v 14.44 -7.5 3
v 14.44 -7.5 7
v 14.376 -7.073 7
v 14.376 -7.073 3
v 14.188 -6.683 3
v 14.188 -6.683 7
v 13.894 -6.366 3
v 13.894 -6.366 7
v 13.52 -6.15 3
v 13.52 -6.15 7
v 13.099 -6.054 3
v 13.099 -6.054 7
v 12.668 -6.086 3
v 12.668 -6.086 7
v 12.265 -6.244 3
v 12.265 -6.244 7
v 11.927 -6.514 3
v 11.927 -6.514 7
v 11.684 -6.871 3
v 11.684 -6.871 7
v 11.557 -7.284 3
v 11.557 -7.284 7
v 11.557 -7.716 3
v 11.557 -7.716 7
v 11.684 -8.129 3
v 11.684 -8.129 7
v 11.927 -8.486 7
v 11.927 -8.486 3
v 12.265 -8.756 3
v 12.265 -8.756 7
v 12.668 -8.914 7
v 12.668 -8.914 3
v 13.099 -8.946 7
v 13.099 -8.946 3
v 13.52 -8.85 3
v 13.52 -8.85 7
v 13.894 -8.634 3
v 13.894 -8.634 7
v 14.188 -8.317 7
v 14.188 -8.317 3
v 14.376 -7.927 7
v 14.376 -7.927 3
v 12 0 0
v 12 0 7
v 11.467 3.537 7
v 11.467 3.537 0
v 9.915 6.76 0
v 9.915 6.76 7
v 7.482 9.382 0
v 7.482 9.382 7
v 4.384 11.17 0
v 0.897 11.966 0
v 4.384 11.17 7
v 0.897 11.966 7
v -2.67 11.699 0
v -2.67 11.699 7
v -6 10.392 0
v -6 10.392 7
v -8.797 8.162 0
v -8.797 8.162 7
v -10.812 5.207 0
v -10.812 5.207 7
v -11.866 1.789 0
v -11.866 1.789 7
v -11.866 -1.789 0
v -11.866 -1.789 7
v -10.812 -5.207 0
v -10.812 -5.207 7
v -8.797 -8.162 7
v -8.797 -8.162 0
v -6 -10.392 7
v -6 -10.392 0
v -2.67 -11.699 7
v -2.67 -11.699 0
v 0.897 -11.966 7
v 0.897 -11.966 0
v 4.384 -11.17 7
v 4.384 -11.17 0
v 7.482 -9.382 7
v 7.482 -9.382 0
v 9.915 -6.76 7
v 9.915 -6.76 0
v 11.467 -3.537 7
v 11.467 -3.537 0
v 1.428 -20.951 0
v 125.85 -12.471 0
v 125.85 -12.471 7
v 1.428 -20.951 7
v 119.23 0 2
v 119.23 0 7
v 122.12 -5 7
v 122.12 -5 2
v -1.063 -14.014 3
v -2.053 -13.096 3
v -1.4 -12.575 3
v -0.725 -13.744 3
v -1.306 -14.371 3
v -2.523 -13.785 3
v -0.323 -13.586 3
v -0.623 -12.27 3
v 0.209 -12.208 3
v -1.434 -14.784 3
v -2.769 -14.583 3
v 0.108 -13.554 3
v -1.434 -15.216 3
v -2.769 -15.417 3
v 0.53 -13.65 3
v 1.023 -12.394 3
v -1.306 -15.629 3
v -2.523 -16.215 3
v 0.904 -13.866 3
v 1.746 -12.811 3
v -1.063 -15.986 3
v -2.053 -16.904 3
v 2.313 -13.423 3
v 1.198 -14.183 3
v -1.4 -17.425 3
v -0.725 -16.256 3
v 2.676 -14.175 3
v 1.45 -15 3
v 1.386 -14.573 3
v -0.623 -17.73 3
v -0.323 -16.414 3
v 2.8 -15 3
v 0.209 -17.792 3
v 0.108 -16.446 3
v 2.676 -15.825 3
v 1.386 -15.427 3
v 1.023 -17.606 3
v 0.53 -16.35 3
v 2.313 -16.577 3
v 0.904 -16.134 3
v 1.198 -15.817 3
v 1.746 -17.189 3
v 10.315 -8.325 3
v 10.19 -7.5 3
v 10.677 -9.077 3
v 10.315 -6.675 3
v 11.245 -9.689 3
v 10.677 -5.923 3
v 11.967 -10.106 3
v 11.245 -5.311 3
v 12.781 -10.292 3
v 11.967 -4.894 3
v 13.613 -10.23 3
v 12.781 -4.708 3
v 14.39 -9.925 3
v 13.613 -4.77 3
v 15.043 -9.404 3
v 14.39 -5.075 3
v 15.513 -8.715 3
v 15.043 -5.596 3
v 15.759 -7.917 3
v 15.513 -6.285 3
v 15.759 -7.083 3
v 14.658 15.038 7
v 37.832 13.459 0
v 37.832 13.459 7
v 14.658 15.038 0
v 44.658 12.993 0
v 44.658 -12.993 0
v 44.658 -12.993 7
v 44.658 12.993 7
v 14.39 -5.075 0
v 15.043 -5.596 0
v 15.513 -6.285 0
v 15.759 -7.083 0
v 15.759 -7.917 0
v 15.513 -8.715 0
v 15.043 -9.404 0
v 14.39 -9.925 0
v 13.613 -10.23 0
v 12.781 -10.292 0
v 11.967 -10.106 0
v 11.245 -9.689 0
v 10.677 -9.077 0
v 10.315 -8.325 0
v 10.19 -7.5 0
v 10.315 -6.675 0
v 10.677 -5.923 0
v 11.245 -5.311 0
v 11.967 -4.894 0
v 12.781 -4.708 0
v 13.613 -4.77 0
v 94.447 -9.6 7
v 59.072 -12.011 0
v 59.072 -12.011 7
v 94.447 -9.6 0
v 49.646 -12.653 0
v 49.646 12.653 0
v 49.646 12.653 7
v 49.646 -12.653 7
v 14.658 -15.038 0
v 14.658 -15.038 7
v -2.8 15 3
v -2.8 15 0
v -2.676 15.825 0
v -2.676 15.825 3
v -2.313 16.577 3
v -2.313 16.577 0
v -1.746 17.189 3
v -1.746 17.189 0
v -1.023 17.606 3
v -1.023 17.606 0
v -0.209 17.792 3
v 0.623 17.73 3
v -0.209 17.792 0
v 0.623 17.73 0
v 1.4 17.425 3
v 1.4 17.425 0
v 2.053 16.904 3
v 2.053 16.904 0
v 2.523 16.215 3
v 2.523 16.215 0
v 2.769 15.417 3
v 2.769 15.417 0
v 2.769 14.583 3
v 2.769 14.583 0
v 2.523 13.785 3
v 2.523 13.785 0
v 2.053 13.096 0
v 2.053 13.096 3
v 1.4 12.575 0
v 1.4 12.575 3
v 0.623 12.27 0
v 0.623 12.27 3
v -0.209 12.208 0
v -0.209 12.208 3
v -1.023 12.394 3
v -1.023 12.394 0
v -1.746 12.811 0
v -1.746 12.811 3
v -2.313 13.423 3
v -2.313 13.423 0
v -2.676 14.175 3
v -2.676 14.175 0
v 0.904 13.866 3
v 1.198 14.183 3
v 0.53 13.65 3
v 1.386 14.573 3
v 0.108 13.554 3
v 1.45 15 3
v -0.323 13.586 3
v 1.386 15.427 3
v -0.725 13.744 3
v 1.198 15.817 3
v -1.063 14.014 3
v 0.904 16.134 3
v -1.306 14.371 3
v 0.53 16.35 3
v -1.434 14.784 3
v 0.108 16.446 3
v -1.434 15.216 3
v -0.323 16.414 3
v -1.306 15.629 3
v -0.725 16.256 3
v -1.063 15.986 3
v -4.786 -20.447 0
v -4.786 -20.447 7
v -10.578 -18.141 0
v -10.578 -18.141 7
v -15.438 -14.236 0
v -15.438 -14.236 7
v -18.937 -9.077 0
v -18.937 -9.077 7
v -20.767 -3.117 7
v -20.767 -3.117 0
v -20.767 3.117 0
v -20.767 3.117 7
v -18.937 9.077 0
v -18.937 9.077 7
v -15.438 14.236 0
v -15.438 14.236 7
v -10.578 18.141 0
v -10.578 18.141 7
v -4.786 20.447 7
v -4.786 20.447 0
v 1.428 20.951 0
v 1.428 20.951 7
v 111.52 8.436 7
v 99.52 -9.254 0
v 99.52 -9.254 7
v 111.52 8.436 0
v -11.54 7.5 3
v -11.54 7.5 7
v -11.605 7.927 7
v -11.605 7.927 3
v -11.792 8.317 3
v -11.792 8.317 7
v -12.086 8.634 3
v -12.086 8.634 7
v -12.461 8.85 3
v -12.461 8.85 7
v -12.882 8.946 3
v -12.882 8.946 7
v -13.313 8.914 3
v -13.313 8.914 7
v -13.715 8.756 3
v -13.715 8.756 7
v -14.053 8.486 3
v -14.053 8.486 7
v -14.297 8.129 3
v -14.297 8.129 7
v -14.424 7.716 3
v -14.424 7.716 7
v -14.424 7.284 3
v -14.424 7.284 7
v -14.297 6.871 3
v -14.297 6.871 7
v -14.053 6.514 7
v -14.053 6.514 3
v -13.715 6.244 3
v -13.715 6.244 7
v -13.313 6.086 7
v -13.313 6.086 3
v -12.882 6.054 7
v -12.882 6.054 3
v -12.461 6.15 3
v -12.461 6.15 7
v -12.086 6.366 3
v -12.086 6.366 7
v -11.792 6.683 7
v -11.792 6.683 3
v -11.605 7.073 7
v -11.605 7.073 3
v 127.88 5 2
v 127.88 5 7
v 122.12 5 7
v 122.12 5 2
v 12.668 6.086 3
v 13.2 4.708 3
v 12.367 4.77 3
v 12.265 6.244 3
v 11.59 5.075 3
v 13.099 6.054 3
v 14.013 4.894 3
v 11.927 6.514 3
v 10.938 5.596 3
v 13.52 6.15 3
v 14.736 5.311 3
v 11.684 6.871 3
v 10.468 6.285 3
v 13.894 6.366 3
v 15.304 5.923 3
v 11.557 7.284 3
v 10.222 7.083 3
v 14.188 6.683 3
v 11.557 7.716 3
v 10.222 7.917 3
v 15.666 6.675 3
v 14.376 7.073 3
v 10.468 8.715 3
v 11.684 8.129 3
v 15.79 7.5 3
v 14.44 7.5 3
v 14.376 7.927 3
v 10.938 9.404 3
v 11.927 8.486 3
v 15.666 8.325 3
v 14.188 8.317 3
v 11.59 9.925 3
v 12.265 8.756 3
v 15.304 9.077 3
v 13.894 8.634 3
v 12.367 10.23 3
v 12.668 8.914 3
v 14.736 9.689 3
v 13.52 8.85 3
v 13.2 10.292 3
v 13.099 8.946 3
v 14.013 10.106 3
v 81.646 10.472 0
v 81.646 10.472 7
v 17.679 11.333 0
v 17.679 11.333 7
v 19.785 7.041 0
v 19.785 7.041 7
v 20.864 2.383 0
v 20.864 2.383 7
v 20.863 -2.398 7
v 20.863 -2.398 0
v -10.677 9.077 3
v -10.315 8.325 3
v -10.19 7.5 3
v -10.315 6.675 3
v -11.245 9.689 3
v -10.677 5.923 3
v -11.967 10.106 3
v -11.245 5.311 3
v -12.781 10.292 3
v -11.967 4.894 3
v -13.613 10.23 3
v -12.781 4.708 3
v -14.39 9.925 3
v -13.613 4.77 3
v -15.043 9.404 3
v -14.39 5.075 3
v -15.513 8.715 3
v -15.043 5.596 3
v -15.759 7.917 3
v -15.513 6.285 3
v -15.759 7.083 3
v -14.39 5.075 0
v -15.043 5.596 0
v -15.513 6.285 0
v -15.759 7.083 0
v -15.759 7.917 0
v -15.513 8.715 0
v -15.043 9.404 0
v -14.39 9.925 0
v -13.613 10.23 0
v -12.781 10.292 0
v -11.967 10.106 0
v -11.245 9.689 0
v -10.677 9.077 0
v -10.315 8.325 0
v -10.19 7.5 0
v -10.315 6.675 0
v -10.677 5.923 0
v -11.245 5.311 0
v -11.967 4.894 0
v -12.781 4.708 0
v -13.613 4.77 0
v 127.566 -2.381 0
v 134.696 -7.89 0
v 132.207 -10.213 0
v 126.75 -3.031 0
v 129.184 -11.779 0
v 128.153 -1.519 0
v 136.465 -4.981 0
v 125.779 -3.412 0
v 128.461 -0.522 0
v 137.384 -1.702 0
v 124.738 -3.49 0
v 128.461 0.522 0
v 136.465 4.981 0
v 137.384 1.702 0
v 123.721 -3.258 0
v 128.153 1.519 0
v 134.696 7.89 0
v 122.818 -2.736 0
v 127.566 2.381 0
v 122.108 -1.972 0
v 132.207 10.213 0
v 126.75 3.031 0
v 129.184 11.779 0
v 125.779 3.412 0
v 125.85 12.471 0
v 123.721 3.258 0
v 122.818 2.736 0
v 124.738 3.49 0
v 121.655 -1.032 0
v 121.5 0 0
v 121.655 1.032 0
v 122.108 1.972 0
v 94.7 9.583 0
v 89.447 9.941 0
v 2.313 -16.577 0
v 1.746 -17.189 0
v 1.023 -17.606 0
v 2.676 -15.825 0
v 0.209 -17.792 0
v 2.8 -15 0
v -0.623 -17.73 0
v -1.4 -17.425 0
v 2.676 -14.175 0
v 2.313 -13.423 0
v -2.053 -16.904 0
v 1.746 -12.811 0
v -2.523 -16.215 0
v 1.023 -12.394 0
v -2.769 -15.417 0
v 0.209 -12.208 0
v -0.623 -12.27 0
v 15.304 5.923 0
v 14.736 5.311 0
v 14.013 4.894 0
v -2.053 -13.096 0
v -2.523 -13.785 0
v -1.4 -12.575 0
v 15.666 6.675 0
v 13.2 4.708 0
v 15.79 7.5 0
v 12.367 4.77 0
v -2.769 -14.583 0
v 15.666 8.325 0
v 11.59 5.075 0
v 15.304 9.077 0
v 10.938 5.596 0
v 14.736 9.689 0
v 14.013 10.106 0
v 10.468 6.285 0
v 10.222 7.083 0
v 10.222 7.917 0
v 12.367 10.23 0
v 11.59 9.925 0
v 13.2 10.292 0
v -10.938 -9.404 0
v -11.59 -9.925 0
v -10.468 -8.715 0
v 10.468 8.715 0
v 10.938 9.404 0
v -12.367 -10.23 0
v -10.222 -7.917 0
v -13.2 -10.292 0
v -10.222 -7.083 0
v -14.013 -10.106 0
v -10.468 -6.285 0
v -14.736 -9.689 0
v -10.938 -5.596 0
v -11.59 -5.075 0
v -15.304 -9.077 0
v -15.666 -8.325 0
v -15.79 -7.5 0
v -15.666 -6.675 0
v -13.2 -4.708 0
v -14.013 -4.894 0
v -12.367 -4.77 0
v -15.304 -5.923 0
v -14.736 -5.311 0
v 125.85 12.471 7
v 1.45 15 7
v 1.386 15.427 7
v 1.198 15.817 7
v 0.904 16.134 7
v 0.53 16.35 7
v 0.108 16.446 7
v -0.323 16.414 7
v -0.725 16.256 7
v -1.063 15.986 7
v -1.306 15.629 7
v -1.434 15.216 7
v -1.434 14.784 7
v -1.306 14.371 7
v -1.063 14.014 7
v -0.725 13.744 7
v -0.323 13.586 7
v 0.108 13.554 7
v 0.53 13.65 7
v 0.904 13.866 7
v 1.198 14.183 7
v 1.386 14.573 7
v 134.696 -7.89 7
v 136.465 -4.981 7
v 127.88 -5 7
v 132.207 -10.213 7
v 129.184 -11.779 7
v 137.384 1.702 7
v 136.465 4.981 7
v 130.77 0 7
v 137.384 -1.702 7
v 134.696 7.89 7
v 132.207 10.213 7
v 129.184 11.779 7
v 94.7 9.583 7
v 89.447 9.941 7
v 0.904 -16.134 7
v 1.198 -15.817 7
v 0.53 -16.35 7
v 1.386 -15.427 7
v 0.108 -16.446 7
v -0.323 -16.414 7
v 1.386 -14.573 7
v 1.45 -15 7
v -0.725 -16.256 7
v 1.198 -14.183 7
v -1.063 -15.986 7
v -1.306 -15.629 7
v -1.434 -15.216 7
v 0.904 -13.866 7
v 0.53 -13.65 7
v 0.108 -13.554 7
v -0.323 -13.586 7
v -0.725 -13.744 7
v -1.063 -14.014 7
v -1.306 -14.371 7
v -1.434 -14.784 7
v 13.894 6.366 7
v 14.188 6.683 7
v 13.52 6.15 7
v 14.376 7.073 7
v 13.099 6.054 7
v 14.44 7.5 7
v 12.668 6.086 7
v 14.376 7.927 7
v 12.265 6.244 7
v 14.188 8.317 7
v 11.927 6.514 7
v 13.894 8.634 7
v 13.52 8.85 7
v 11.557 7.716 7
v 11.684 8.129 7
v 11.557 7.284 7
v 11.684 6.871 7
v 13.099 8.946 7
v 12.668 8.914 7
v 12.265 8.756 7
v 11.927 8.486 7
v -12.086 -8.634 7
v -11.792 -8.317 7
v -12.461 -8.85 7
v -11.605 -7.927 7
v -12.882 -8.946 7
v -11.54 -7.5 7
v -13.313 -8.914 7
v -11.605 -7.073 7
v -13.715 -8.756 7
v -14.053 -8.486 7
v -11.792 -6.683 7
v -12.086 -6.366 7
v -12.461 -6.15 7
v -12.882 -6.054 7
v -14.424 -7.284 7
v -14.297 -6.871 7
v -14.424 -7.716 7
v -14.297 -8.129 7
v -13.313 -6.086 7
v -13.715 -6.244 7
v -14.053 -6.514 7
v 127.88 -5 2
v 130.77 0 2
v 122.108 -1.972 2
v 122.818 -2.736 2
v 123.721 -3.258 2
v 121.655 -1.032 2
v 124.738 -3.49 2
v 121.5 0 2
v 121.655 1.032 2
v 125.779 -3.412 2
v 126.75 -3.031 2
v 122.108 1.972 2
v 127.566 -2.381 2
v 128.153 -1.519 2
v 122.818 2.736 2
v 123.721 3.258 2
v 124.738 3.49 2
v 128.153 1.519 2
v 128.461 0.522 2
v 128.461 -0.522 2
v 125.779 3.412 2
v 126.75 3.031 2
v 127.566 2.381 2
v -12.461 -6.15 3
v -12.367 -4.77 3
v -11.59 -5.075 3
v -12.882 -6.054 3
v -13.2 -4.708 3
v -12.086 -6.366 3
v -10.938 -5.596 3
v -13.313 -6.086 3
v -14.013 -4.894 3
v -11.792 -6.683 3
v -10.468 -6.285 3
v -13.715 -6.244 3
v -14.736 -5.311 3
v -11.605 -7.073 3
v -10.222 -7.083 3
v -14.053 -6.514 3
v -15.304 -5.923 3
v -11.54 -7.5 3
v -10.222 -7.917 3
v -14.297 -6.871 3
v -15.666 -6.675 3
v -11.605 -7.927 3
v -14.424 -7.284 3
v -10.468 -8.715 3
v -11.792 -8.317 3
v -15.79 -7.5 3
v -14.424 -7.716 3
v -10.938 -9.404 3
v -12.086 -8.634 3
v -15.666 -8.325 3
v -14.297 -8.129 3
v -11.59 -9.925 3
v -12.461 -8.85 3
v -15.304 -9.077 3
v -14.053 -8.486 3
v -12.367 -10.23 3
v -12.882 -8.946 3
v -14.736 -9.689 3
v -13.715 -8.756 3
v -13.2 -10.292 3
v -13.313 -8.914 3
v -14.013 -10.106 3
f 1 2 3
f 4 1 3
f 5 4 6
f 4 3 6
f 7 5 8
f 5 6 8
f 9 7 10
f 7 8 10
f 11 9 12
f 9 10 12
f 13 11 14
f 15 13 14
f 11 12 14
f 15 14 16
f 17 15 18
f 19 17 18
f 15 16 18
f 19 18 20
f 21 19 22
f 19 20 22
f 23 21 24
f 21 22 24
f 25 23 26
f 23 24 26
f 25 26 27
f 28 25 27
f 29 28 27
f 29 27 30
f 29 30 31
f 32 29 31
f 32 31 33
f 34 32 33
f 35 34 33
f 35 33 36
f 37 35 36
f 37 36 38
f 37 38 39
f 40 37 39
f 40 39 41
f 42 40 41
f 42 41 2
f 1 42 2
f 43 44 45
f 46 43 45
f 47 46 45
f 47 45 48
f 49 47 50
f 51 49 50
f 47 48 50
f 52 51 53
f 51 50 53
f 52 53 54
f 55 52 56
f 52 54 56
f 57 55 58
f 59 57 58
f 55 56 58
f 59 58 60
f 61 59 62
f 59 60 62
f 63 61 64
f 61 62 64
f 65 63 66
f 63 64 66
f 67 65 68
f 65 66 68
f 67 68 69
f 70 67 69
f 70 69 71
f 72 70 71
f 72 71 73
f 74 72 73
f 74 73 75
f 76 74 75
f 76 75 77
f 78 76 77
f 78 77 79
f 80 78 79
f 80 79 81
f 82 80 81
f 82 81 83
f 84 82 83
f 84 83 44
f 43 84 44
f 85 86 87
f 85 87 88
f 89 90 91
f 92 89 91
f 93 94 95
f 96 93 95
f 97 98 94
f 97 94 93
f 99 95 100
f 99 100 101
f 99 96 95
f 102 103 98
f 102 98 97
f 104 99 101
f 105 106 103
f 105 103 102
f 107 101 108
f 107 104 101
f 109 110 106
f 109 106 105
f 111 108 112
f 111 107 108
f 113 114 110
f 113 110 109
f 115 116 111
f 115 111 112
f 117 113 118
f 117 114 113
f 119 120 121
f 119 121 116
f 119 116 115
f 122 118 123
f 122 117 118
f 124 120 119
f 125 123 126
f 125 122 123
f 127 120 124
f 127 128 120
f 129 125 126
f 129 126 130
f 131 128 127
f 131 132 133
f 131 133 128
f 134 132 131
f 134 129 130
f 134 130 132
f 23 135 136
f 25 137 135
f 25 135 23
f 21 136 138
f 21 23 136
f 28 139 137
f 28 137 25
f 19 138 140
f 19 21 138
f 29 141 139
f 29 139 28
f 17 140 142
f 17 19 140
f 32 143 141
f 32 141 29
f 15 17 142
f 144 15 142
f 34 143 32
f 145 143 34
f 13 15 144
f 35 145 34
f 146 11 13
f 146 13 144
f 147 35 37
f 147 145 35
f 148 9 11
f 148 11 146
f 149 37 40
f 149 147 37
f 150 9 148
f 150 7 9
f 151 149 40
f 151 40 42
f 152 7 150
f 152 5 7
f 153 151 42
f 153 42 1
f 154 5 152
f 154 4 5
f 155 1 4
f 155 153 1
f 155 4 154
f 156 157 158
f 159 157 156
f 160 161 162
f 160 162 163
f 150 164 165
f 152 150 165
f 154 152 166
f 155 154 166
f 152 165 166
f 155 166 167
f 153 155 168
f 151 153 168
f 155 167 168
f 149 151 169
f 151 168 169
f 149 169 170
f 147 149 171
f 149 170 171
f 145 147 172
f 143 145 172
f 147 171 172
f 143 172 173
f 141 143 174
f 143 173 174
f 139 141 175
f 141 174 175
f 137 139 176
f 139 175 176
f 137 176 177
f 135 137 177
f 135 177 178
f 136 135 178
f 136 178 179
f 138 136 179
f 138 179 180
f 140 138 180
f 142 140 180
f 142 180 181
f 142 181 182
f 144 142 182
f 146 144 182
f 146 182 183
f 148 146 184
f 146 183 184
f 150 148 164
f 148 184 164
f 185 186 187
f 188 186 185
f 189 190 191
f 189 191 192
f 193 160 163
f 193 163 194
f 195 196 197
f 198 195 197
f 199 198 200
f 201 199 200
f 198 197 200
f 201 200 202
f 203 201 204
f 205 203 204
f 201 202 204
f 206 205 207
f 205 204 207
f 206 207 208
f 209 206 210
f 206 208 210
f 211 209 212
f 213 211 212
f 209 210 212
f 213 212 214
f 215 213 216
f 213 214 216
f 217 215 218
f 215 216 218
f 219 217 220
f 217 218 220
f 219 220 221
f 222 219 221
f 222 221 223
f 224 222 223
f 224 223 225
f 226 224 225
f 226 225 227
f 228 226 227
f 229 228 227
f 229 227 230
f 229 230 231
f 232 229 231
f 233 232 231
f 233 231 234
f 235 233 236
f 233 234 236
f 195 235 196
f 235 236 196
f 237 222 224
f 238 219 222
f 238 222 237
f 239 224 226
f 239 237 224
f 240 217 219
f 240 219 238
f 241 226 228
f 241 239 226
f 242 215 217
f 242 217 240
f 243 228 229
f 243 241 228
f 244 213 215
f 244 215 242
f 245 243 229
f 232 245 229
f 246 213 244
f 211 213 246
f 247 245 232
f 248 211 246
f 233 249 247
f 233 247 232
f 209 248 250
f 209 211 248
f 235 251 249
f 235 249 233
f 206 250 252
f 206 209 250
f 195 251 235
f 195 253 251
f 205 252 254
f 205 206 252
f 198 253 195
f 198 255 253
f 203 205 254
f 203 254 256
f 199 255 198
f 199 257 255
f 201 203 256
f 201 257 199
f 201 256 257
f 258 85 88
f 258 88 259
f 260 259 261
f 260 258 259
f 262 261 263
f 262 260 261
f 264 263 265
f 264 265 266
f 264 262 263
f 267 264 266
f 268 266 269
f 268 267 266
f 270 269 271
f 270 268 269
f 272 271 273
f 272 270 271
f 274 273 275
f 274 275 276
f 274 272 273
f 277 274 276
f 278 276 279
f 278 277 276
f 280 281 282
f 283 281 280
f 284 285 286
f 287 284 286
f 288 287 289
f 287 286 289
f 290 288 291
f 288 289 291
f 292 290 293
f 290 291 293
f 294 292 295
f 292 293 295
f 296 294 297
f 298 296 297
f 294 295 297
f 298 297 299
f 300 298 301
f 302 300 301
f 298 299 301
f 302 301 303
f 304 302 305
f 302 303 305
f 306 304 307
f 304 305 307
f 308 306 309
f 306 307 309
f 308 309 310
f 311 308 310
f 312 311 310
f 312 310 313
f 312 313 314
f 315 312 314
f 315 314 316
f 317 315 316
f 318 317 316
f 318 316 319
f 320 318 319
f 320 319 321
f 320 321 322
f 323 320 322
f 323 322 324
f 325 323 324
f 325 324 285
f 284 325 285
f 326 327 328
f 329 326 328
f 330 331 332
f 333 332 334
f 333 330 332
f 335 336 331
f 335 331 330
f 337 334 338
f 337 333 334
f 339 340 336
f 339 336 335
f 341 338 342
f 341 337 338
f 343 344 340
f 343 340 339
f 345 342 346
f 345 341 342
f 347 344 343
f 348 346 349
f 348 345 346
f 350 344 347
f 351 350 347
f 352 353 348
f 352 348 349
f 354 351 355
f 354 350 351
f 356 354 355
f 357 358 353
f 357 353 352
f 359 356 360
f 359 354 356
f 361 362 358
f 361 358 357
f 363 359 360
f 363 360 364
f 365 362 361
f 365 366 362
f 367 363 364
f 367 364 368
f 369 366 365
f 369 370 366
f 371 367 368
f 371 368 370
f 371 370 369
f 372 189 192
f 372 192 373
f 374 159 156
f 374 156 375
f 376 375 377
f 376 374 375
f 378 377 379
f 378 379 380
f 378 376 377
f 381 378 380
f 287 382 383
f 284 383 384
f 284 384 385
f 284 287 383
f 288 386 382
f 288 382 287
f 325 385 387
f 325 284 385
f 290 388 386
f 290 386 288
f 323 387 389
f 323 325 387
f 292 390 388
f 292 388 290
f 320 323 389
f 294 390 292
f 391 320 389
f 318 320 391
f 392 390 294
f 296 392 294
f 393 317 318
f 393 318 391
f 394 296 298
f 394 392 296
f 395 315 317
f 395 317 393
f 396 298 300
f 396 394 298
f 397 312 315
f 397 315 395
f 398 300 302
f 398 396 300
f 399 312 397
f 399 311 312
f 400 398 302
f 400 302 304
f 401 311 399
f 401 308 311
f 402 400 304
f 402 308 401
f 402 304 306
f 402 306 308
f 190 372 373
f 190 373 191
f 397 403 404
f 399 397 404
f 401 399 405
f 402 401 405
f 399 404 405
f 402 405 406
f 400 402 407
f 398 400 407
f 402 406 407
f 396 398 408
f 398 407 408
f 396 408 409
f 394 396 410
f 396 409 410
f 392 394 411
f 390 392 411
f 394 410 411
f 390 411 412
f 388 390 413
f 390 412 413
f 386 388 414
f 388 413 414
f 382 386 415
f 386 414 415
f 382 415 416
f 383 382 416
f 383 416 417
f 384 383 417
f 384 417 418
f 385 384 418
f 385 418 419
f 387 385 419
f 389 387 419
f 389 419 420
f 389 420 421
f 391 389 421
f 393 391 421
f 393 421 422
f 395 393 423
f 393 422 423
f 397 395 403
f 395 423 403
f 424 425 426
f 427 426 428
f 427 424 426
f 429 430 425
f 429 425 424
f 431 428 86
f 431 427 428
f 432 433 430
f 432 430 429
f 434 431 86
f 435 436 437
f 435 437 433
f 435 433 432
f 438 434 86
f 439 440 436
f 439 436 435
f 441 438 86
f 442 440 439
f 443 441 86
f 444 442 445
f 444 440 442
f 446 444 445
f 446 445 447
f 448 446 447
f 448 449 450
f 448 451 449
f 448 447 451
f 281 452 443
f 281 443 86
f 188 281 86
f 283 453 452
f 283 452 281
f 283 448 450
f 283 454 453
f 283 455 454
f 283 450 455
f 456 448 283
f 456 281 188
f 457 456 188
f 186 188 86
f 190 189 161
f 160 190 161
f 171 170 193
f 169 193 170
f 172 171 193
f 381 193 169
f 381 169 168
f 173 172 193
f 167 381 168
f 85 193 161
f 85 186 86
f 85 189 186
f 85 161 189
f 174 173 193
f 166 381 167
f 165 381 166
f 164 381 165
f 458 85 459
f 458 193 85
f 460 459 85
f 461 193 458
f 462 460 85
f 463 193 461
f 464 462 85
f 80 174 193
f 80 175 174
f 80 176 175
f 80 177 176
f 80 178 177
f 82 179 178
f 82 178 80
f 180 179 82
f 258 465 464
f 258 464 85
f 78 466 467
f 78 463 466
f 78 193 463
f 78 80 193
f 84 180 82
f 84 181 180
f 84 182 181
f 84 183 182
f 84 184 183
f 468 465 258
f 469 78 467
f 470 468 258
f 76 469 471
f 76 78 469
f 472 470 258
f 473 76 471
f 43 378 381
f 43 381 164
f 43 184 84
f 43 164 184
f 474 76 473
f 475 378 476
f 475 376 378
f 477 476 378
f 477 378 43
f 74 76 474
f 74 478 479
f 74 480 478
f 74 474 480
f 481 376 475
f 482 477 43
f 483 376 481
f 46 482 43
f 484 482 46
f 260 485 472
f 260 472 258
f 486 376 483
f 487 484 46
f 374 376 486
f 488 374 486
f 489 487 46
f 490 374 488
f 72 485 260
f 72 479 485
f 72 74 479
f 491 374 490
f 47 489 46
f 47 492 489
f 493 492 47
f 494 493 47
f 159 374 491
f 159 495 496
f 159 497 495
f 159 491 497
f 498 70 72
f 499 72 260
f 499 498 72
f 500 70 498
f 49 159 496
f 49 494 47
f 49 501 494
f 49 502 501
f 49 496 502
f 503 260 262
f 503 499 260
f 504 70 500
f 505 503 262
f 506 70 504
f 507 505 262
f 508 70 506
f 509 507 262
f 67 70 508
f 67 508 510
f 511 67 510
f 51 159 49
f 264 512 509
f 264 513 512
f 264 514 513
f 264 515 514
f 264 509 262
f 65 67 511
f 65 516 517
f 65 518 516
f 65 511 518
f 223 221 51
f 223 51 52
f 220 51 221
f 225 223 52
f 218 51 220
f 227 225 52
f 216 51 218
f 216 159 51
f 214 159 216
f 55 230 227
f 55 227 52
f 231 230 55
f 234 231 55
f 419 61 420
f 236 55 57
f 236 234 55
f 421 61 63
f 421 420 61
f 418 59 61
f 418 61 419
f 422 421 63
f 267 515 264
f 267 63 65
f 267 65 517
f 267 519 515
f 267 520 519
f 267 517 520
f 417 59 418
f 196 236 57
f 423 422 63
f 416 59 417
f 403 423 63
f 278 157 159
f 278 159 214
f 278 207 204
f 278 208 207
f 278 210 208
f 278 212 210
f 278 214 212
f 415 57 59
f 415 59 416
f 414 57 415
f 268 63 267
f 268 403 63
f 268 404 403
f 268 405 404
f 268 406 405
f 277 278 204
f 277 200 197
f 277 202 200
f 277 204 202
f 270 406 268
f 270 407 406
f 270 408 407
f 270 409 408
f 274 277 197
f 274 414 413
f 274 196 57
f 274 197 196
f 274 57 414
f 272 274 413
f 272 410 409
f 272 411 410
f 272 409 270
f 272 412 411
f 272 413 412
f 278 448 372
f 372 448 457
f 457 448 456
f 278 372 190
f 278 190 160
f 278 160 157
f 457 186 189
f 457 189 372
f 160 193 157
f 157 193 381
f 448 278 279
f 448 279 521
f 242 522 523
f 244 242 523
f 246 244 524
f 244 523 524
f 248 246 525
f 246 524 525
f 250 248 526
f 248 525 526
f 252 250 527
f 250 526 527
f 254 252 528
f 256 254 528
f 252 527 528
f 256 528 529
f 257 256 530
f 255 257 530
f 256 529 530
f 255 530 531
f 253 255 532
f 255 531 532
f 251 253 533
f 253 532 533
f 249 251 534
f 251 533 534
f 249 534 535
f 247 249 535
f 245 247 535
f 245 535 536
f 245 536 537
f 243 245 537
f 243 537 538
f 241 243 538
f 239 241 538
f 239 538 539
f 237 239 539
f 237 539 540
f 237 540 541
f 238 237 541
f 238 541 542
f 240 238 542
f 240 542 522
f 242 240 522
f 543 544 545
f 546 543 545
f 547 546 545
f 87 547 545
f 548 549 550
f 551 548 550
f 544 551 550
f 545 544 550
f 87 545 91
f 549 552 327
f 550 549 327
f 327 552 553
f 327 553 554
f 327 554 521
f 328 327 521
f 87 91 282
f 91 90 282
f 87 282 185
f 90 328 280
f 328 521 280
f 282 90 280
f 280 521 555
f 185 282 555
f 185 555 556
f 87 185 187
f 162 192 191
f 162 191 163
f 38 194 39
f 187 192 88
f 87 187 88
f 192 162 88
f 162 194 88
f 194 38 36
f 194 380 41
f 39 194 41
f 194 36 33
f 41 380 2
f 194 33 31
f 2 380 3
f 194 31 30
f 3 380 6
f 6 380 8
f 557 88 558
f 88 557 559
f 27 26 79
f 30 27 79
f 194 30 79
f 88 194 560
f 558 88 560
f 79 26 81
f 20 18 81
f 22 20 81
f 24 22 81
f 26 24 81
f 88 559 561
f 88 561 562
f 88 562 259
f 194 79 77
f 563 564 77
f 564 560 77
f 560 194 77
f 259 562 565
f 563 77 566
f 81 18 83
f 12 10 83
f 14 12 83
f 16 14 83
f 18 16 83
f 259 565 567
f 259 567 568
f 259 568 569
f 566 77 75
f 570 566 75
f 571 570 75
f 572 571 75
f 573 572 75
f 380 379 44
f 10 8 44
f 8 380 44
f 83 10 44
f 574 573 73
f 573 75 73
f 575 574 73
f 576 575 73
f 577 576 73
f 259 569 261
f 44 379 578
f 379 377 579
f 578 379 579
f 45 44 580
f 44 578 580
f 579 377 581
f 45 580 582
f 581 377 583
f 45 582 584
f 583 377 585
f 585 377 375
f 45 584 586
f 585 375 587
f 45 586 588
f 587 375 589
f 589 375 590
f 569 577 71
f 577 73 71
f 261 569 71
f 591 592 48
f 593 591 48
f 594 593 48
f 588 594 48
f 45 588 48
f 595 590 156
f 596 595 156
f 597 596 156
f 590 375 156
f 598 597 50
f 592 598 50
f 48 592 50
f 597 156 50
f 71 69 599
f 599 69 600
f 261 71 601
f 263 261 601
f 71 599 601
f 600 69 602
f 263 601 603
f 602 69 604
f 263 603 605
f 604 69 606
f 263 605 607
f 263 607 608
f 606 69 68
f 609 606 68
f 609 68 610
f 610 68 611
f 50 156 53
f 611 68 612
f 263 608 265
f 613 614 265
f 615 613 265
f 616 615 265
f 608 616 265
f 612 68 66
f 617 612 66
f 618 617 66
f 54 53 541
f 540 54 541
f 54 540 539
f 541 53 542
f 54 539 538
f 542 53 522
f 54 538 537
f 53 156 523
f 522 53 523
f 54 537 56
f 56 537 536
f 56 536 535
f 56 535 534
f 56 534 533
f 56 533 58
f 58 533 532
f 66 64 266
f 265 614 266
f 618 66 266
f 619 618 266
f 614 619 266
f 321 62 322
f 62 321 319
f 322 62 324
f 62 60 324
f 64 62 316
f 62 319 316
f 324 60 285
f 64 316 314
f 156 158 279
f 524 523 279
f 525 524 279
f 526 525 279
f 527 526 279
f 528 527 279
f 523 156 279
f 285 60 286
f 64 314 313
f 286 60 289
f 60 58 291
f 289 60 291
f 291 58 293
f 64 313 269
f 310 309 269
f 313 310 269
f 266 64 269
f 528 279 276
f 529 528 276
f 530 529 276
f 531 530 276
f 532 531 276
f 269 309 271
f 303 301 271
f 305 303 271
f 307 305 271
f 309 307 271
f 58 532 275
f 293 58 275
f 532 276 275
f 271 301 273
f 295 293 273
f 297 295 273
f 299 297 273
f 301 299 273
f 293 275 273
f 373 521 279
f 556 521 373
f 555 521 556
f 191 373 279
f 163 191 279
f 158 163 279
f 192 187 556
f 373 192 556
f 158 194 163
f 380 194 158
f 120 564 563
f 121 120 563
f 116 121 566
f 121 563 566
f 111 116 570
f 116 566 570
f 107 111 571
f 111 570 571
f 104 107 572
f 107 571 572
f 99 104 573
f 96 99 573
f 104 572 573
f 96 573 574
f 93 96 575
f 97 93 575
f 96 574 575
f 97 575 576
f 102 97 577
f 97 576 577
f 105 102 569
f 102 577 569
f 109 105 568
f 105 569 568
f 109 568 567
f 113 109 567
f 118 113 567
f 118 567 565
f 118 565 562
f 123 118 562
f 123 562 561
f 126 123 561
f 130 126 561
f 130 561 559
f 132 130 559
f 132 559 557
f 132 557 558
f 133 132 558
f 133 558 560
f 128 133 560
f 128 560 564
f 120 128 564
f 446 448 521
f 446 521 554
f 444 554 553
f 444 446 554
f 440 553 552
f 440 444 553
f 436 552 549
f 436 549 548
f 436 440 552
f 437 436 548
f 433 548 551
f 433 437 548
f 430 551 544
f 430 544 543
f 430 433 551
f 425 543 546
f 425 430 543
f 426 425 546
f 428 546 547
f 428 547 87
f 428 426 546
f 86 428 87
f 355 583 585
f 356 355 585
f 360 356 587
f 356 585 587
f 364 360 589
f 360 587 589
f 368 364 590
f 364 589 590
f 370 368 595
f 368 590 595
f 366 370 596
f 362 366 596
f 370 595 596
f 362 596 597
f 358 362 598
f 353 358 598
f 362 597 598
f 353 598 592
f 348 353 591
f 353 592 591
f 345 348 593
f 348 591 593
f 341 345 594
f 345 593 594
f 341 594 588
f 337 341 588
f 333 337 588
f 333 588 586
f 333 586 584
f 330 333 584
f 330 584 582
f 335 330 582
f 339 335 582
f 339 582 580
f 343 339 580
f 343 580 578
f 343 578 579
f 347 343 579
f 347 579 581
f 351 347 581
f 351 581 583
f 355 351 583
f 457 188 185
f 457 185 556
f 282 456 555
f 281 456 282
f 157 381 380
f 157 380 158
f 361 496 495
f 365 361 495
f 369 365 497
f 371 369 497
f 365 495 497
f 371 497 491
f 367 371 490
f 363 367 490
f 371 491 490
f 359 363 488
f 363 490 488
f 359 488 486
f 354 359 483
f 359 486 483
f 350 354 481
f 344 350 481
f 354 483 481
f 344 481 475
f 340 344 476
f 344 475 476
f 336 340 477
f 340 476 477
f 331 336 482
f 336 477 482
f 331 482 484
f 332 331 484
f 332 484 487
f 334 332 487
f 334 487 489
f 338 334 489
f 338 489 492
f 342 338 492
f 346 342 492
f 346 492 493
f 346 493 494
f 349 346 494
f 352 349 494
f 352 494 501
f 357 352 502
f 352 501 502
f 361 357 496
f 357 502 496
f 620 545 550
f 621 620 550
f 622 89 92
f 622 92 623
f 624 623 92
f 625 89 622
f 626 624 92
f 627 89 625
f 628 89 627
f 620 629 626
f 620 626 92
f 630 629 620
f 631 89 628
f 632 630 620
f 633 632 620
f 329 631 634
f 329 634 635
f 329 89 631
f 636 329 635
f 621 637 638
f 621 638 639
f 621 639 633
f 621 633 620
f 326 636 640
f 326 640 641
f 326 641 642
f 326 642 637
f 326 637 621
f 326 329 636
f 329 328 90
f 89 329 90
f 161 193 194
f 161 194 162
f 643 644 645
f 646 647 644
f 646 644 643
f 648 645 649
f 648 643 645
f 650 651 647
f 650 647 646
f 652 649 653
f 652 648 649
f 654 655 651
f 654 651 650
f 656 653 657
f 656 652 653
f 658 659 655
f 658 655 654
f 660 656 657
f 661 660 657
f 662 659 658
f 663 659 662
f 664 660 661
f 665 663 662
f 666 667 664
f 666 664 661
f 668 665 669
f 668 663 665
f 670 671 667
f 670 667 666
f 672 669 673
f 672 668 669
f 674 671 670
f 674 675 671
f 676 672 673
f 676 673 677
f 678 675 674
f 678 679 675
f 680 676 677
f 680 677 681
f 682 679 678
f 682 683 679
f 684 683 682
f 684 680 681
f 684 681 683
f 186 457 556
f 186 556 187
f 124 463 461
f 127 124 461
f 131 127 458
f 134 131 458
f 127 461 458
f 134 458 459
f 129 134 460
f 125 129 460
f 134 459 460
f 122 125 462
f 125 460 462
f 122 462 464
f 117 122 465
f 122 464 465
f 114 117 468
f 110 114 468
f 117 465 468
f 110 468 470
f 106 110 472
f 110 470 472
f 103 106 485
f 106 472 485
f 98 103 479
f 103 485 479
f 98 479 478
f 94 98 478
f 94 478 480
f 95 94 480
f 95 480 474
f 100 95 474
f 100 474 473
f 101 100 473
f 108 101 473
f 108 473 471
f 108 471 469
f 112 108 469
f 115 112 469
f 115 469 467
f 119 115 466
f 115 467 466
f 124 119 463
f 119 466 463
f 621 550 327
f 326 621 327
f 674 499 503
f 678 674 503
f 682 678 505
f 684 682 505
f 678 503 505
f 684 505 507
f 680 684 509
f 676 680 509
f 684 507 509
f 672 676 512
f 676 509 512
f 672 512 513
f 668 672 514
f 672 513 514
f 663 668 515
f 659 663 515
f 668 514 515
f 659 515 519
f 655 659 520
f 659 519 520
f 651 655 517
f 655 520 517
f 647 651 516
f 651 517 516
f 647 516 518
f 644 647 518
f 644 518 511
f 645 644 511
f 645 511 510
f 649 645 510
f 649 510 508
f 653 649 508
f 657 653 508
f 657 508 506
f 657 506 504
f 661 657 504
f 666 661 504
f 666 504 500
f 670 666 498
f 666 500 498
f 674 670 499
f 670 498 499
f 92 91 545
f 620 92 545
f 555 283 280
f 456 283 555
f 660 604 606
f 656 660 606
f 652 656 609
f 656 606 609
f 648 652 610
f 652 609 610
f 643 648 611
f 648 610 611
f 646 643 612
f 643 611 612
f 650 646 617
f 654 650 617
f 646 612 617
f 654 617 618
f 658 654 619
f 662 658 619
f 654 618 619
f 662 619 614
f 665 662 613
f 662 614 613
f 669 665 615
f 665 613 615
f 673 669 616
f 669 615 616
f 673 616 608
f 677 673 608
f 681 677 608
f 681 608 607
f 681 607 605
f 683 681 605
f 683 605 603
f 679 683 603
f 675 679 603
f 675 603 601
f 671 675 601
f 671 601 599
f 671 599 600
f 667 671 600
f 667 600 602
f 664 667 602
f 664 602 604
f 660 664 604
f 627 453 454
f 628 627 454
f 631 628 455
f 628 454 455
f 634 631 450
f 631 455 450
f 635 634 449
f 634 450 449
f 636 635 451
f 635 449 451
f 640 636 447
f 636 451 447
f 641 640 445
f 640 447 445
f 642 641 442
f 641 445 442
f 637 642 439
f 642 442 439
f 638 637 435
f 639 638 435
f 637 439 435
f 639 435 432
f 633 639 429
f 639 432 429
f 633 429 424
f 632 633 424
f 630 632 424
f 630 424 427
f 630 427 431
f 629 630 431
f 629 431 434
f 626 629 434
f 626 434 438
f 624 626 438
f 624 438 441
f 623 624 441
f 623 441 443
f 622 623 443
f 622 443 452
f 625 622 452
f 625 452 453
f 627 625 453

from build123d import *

# Parameters (mm, degrees)
EXTRUDE_1_DEPTH          = 7
CUT_EXTRUDE_1_DEPTH      = 140.270420406
CUT_EXTRUDE_1_DEPTH_BACK = 140.270420406
CUT_EXTRUDE_2_DEPTH      = 5
SKETCH_12_R              = 1.45
CUT_EXTRUDE_3_DEPTH      = 140.270420406
SKETCH_14_R              = 12
CUT_EXTRUDE_4_DEPTH      = 140.270420406
SKETCH_15_R              = 3.5
CUT_EXTRUDE_5_DEPTH      = 10
SKETCH_16_R              = 2.8
CUT_EXTRUDE_6_DEPTH      = 3
PATTERN_CIRCULAR_1_COUNT = 6


with BuildPart() as part:
    # 草图2 → 凸台-拉伸1 (new body)
    with BuildSketch(Plane.XY):
        with BuildLine():
            Line((1.428, 20.951391744), (125.85, 12.471066514))
            ThreePointArc((125.85, 12.471066514), (137.5, 0), (125.85, -12.471066514))
            Line((125.85, -12.471066514), (1.428, -20.951391744))
            ThreePointArc((1.428, -20.951391744), (-21, 0), (1.428, 20.951391744))
        make_face()
    extrude(amount=EXTRUDE_1_DEPTH)

    # 草图3 → 切除-拉伸1 (cut, two sides: drawn at the far end of the back side and taken through both)
    with BuildSketch(Plane.XY.offset(7).offset(-CUT_EXTRUDE_1_DEPTH_BACK)):
        with BuildLine():
            ThreePointArc((14.657987472, 15.038065143), (19.784577979, 7.04063024), (20.86269223, -2.397513905))
            Line((20.86269223, -2.397513905), (37.832309087, 13.458555215))
            Line((37.832309087, 13.458555215), (14.657987472, 15.038065143))
        make_face()
        Polygon((44.657987472, 12.993332243), (14.657987472, -15.038065143), (44.657987472, -12.993332243), align=None)
        Polygon((49.646414078, 12.653332243), (49.646414078, -12.653332243), (81.646414078, 10.472283817), align=None)
        Polygon((89.447040438, 9.940610571), (59.071666369, -12.010928128), (94.447040438, -9.599821755), align=None)
        Polygon((111.519663952, 8.436189922), (94.699739521, 9.58259835), (99.519663952, -9.254083082), align=None)
    extrude(amount=CUT_EXTRUDE_1_DEPTH + CUT_EXTRUDE_1_DEPTH_BACK, mode=Mode.SUBTRACT)

    # 草图7 → 切除-拉伸2 (cut)
    with BuildSketch(Plane.XY.offset(7)):
        Polygon((127.879739572, 5), (122.120260428, 5), (119.23, 0), (122.120260428, -5), (127.879739572, -5), (130.77, 0), align=None)
    extrude(amount=-CUT_EXTRUDE_2_DEPTH, mode=Mode.SUBTRACT)

    # 草图12 → 切除-拉伸3 (cut, through all)
    with BuildSketch(Plane.XY.offset(7)):
        with Locations((0, 15)):
            Circle(SKETCH_12_R)
        with Locations((12.990381057, 7.5)):
            Circle(SKETCH_12_R)
        with Locations((12.990381057, -7.5)):
            Circle(SKETCH_12_R)
        with Locations((0, -15)):
            Circle(SKETCH_12_R)
        with Locations((-12.990381057, -7.5)):
            Circle(SKETCH_12_R)
        with Locations((-12.990381057, 7.5)):
            Circle(SKETCH_12_R)
    extrude(amount=-CUT_EXTRUDE_3_DEPTH, mode=Mode.SUBTRACT)

    # 草图14 → 切除-拉伸4 (cut, through all)
    with BuildSketch(Plane.XY.offset(7)):
        Circle(SKETCH_14_R)
    extrude(amount=-CUT_EXTRUDE_4_DEPTH, mode=Mode.SUBTRACT)

    # 草图15 → 切除-拉伸5 (cut)
    with BuildSketch(Plane(origin=(0, 0, 0), x_dir=(-1, 0, 0), z_dir=(0, 0, -1))):
        with Locations((-125, 0)):
            Circle(SKETCH_15_R)
    extrude(amount=-CUT_EXTRUDE_5_DEPTH, mode=Mode.SUBTRACT)

    # 草图16 → 切除-拉伸6 (cut)
    with BuildSketch(Plane(origin=(0, 0, 0), x_dir=(-1, 0, 0), z_dir=(0, 0, -1))):
        with Locations((0, 15)):
            Circle(SKETCH_16_R)
    cut_extrude_6 = extrude(amount=-CUT_EXTRUDE_6_DEPTH, mode=Mode.SUBTRACT)

    # 阵列(圆周)1: 切除-拉伸6 ×6 about axis
    pattern_circular_1_axis = Axis((0, 0, 0), (0, 0, 1))
    for i in range(1, PATTERN_CIRCULAR_1_COUNT):
        add(cut_extrude_6.rotate(pattern_circular_1_axis, i * 360 / PATTERN_CIRCULAR_1_COUNT), mode=Mode.SUBTRACT)


solid = part.part
